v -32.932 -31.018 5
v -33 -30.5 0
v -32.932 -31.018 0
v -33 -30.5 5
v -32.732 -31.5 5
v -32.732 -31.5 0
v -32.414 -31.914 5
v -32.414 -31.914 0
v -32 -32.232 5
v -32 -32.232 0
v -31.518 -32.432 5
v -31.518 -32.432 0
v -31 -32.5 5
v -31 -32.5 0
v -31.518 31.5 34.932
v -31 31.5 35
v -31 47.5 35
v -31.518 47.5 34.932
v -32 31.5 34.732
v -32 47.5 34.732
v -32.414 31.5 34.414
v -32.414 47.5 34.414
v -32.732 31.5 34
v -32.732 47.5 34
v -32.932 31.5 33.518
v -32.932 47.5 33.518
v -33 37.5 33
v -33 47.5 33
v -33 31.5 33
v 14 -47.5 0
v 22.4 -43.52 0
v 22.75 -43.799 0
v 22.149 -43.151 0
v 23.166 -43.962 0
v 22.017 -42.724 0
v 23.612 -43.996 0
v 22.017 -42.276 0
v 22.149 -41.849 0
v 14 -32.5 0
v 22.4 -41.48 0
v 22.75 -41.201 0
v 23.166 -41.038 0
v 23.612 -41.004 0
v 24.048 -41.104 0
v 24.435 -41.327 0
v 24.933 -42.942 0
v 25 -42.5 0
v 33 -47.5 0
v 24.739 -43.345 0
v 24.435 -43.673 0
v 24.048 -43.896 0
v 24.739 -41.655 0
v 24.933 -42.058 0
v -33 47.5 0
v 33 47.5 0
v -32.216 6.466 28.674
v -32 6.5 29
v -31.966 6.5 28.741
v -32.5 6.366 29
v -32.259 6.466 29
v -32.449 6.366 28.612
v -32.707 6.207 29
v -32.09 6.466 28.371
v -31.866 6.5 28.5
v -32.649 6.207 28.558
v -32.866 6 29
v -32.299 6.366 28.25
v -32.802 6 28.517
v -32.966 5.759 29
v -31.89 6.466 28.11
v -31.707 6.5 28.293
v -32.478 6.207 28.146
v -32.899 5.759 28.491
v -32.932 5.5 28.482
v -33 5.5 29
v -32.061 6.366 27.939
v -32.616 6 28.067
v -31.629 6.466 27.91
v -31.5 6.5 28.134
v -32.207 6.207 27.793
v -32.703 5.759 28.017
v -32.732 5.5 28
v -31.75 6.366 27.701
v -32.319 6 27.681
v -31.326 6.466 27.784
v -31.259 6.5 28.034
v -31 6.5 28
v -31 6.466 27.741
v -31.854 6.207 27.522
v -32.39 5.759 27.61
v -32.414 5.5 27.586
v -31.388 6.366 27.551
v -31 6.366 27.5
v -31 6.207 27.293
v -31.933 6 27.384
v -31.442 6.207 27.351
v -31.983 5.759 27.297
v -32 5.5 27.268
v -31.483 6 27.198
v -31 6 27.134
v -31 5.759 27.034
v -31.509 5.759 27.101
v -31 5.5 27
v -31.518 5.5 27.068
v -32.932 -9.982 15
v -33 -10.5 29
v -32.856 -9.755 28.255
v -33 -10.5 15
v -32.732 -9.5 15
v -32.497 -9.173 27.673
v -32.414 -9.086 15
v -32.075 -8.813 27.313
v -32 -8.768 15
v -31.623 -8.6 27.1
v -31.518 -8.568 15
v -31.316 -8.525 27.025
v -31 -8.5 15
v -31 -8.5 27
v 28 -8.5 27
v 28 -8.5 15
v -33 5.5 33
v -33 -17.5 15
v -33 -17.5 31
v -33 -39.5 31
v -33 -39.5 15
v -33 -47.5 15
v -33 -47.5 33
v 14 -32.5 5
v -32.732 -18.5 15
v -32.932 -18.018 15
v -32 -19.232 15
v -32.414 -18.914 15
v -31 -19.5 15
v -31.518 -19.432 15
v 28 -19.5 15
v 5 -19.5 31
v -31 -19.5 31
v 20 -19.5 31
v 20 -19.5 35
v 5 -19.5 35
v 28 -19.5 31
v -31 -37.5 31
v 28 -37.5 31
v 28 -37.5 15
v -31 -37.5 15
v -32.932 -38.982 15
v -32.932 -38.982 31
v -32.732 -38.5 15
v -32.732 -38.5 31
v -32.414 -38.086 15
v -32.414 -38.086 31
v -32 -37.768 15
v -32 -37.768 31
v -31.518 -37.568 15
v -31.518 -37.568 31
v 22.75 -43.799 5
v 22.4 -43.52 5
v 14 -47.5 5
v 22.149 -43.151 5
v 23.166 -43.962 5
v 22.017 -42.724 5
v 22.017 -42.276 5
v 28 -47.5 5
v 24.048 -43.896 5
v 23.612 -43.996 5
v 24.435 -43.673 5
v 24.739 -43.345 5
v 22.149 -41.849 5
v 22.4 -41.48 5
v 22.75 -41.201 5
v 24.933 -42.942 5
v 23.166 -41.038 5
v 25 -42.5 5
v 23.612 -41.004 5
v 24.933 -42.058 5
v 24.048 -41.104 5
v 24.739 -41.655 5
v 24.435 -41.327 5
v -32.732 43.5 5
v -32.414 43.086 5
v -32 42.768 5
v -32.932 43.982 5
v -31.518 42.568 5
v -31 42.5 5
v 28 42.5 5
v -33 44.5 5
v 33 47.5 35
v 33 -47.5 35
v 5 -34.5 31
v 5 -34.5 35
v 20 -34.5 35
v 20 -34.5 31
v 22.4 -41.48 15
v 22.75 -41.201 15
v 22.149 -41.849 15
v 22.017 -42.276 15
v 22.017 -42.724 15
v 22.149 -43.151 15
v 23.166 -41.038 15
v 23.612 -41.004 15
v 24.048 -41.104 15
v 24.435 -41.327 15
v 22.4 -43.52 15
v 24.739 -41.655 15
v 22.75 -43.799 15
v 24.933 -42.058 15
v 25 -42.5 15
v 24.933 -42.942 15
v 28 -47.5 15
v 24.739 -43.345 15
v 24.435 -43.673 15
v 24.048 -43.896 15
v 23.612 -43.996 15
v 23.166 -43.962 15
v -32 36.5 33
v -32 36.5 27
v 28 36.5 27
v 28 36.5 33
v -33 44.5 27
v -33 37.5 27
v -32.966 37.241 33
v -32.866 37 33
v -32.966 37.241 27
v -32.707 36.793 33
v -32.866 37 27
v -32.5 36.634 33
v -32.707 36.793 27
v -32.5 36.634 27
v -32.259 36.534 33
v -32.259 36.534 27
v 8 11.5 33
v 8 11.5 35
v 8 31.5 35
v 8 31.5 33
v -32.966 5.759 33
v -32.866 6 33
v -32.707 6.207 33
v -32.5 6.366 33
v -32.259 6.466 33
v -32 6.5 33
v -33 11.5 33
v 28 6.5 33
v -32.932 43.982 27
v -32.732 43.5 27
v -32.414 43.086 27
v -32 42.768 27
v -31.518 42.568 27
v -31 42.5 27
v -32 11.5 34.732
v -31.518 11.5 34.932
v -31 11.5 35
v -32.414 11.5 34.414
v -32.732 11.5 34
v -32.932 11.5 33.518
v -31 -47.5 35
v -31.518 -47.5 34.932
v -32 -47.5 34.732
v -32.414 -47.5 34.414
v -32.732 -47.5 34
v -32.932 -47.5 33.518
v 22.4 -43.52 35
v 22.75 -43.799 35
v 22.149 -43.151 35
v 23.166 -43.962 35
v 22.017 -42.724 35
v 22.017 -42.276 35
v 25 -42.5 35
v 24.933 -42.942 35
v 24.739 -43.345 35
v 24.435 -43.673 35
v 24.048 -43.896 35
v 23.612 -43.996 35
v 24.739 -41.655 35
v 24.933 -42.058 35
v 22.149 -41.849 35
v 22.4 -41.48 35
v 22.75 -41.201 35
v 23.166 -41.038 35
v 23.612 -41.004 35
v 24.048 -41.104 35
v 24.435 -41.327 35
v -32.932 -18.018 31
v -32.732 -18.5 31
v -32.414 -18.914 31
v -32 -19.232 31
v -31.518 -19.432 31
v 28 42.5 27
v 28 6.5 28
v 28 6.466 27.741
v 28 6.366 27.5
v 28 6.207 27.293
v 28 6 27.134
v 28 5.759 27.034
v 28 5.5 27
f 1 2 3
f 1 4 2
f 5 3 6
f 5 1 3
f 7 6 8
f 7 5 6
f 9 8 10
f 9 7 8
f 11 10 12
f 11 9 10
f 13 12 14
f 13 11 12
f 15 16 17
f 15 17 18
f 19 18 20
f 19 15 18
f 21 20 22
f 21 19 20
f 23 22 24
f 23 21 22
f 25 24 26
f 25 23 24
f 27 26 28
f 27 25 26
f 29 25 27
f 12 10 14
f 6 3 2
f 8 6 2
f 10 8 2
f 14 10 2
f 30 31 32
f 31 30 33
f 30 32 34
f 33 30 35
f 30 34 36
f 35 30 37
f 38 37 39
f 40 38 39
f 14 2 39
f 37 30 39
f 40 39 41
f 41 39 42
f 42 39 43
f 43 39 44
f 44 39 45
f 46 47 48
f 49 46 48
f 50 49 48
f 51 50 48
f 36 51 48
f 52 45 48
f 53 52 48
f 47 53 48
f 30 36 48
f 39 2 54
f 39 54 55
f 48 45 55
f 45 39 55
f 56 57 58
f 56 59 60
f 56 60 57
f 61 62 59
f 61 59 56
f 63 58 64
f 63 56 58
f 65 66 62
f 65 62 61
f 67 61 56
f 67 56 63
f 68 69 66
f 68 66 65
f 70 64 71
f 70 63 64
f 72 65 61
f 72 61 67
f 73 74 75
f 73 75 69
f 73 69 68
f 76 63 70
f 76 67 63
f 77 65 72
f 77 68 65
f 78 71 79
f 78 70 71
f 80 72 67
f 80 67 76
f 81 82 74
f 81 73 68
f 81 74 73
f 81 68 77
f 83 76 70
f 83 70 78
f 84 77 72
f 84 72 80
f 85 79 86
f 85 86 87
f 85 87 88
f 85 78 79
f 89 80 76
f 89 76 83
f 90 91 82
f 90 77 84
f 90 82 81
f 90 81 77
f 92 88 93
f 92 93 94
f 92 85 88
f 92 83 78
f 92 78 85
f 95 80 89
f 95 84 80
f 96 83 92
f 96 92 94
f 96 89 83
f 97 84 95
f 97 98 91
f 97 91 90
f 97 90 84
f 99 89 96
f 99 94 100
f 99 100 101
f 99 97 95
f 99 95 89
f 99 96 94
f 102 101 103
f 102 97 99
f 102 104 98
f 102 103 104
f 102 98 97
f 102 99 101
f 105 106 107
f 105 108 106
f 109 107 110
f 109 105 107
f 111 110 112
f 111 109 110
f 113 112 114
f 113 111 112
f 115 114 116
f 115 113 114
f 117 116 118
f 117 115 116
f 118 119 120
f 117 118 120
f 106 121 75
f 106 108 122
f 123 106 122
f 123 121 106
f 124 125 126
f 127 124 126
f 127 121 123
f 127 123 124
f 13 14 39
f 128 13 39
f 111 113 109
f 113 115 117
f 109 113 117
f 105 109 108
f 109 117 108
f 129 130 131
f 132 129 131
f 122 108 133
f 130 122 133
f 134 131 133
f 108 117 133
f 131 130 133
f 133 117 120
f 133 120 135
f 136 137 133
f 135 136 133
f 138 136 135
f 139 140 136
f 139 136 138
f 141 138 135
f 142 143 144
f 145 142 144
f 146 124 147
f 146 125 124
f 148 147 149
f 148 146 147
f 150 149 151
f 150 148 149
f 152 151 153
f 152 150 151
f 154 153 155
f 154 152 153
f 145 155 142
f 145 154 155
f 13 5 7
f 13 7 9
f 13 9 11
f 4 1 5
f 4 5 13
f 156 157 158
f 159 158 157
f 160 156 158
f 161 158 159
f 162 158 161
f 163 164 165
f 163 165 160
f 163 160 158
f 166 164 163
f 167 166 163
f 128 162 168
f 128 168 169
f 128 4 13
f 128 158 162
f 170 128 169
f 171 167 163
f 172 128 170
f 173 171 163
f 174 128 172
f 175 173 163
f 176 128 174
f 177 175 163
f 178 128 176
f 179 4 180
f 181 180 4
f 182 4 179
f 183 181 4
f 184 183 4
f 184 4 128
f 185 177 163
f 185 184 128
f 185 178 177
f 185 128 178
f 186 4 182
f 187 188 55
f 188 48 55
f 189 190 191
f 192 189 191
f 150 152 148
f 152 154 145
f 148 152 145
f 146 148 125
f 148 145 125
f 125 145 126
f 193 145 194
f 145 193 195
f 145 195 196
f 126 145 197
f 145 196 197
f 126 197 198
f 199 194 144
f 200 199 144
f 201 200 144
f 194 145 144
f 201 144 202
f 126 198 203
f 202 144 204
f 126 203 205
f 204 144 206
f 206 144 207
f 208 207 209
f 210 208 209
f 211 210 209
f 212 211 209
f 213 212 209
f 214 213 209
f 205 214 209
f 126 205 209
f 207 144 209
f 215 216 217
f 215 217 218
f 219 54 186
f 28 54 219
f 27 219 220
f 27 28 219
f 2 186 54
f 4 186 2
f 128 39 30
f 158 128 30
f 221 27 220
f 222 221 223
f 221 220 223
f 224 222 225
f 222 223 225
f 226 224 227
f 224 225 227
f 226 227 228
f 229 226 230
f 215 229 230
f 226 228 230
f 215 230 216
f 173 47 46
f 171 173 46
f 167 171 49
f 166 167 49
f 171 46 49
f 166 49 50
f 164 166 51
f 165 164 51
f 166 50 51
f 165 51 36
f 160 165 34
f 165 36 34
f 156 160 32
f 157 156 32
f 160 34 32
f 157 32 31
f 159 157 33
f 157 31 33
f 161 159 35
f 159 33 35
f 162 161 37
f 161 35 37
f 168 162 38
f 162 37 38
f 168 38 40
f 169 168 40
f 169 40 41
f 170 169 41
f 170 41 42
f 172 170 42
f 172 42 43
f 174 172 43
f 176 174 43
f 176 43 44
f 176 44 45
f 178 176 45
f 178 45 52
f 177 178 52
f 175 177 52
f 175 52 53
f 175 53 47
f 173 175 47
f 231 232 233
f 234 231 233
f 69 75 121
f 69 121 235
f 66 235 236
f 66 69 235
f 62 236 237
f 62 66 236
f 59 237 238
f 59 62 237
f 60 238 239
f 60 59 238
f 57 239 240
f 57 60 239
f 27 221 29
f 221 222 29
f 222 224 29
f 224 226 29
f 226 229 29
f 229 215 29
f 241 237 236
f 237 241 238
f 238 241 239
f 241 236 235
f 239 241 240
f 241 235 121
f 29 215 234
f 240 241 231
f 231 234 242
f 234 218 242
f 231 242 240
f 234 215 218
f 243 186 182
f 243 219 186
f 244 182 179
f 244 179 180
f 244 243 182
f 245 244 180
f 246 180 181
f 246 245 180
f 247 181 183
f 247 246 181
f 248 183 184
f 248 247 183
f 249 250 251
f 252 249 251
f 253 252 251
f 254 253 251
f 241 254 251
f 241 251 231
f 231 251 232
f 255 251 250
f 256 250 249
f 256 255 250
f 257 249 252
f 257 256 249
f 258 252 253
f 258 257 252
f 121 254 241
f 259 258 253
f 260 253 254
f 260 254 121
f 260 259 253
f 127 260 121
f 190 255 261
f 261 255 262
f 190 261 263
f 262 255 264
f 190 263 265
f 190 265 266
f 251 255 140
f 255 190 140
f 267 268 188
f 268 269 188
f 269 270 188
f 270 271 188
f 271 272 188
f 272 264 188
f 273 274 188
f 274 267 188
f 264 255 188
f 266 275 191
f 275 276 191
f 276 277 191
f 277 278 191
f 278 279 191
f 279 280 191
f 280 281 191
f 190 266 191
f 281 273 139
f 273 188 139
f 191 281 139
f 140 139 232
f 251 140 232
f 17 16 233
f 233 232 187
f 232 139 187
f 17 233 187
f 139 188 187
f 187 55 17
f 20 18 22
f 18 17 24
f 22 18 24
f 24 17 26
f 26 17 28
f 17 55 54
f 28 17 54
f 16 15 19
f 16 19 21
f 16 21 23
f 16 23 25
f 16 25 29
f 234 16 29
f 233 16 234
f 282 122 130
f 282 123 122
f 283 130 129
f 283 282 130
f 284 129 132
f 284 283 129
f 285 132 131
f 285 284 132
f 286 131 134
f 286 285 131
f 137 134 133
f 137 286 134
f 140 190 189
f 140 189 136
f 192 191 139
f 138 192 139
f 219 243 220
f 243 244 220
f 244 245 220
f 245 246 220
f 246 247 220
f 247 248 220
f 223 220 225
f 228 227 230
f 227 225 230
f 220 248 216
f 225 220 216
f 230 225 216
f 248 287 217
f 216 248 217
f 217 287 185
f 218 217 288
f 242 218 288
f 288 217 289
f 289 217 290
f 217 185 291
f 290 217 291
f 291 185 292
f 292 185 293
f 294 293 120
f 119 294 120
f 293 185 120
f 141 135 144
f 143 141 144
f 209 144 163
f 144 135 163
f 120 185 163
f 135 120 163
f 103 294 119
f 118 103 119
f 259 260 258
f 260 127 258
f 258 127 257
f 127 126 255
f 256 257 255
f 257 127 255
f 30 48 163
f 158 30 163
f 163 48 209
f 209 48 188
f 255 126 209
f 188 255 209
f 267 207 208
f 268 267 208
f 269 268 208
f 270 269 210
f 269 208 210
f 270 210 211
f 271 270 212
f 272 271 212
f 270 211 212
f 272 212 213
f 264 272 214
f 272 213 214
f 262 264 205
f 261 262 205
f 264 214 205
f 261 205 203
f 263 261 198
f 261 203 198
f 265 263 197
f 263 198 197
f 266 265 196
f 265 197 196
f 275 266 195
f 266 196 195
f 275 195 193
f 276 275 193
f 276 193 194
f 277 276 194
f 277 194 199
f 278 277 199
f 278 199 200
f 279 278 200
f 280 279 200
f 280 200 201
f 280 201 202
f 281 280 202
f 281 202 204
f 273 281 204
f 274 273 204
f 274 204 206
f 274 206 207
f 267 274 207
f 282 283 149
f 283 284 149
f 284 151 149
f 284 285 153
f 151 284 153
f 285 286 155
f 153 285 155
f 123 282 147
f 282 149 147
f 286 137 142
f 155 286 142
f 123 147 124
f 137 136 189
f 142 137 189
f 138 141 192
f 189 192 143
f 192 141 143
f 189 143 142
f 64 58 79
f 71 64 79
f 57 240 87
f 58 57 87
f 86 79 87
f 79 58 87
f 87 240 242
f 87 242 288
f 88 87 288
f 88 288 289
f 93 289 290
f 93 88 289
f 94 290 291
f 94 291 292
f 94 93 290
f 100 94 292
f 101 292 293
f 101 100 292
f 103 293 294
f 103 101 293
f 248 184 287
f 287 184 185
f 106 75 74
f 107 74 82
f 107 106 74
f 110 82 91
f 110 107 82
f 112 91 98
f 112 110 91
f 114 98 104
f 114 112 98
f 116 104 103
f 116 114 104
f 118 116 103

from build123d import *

# Parameters (mm, degrees)
F1_DEPTH     = 5
F3_DEPTH     = 30
F5_DEPTH     = 61
F6_W         = 41
F6_H         = 20
F6_W_2       = 15
F6_H_2       = 15
F7_DEPTH     = 4.001
F8_R         = 1.5
F9_DEPTH     = 35.001
F10_R        = 2
F11_T1_DEPTH = 8.5
F11_T3_DEPTH = 4
F11_T5_DEPTH = 59
F11_T8_ANGLE = 90


# Not quite as in the source:
# - a fillet or chamfer that OpenCascade refuses, or shapes differently, is made with other operations: its cross-section is extruded or revolved along the edge and cut away or added


with BuildPart() as f1:
    # F0 (on Top) → F1 (new body)
    with BuildSketch(Plane.XY):
        Polygon((33, 47.5), (-33, 47.5), (-33, -32.5), (14, -32.5), (14, -47.5), (33, -47.5), align=None)
    extrude(amount=F1_DEPTH)

    # F2 (on face) → F3 (join)
    with BuildSketch(Plane.XY.offset(5)):
        Polygon((-33, 42.5), (28, 42.5), (28, -47.5), (33, -47.5), (33, 47.5), (-33, 47.5), align=None)
    extrude(amount=F3_DEPTH)

    # F4 (on face) → F5 (join, through all)
    with BuildSketch(Plane(origin=(28, 0, 0), x_dir=(0, -1, 0), z_dir=(-1, 0, 0))):
        Polygon((47.5, 35), (-42.5, 35), (-42.5, 27), (-36.5, 27), (-36.5, 33), (-6.5, 33), (-6.5, 27), (8.5, 27), (8.5, 15), (19.5, 15), (19.5, 31), (37.5, 31), (37.5, 15), (47.5, 15), align=None)
    extrude(amount=F5_DEPTH)

    # F6 (on face) → F7 (cut, through all)
    with BuildSketch(Plane.XY.offset(35)):
        with Locations((-12.5, 21.5)):
            Rectangle(F6_W, F6_H)
        with Locations((12.5, -27)):
            Rectangle(F6_W_2, F6_H_2)
    extrude(amount=-F7_DEPTH, mode=Mode.SUBTRACT)

    # F8 (on face) → F9 (cut, through all)
    with BuildSketch(Plane(origin=(0, 0, 0), x_dir=(1, 0, 0), z_dir=(0, 0, -1))):
        with Locations((23.5, 42.5)):
            Circle(F8_R)
    extrude(amount=-F9_DEPTH, mode=Mode.SUBTRACT)

    # F10
    f10_edges = [f1.edges().sort_by_distance(p)[0] for p in [
        (-33, -18, 35),
        (-33, 39.5, 35),
        (-33, -19.5, 23),
        (-33, -37.5, 23),
        (-33, -8.5, 21),
        (-33, -1, 27),
        (-33, 42.5, 16),
        (-33, -32.5, 2.5),
    ]]
    fillet(f10_edges, radius=F10_R)

    # F11: fillet of radius 1 on 2 edges, made by hand

    # F11_s2 → F11_t1 (cut)
    with BuildSketch(Plane.XY.offset(24.5)):
        with BuildLine():
            ThreePointArc((-33, 37.5), (-32.7071067812, 36.7928932188), (-32, 36.5))
            Line((-32, 36.5), (-33, 36.5))
            Line((-33, 36.5), (-33, 37.5))
        make_face()
    extrude(amount=F11_T1_DEPTH, mode=Mode.SUBTRACT)

    # F11_s4 → F11_t3 (cut)
    with BuildSketch(Plane.XY.offset(29)):
        with BuildLine():
            ThreePointArc((-33, 5.5), (-32.7071067812, 6.2071067812), (-32, 6.5))
            Line((-32, 6.5), (-33, 6.5))
            Line((-33, 6.5), (-33, 5.5))
        make_face()
    extrude(amount=F11_T3_DEPTH, mode=Mode.SUBTRACT)

    # F11_s6 → F11_t5 (cut)
    with BuildSketch(Plane.YZ.offset(-31)):
        with BuildLine():
            ThreePointArc((6.5, 28), (6.2071067812, 27.2928932188), (5.5, 27))
            Line((5.5, 27), (6.5, 27))
            Line((6.5, 27), (6.5, 28))
        make_face()
    extrude(amount=F11_T5_DEPTH, mode=Mode.SUBTRACT)

    # F11_s7 → F11_t8 (revolve, cut)
    with BuildSketch(Plane.XY.offset(29)):
        with BuildLine():
            ThreePointArc((-32, 6.5), (-32.7071067812, 6.2071067812), (-33, 5.5))
            Line((-33, 5.5), (-33, 6.5))
            Line((-33, 6.5), (-32, 6.5))
        make_face()
    revolve(axis=Axis((-31, 6.5, 29), (0, -1, 0)), revolution_arc=F11_T8_ANGLE, mode=Mode.SUBTRACT)


solid = f1.part
